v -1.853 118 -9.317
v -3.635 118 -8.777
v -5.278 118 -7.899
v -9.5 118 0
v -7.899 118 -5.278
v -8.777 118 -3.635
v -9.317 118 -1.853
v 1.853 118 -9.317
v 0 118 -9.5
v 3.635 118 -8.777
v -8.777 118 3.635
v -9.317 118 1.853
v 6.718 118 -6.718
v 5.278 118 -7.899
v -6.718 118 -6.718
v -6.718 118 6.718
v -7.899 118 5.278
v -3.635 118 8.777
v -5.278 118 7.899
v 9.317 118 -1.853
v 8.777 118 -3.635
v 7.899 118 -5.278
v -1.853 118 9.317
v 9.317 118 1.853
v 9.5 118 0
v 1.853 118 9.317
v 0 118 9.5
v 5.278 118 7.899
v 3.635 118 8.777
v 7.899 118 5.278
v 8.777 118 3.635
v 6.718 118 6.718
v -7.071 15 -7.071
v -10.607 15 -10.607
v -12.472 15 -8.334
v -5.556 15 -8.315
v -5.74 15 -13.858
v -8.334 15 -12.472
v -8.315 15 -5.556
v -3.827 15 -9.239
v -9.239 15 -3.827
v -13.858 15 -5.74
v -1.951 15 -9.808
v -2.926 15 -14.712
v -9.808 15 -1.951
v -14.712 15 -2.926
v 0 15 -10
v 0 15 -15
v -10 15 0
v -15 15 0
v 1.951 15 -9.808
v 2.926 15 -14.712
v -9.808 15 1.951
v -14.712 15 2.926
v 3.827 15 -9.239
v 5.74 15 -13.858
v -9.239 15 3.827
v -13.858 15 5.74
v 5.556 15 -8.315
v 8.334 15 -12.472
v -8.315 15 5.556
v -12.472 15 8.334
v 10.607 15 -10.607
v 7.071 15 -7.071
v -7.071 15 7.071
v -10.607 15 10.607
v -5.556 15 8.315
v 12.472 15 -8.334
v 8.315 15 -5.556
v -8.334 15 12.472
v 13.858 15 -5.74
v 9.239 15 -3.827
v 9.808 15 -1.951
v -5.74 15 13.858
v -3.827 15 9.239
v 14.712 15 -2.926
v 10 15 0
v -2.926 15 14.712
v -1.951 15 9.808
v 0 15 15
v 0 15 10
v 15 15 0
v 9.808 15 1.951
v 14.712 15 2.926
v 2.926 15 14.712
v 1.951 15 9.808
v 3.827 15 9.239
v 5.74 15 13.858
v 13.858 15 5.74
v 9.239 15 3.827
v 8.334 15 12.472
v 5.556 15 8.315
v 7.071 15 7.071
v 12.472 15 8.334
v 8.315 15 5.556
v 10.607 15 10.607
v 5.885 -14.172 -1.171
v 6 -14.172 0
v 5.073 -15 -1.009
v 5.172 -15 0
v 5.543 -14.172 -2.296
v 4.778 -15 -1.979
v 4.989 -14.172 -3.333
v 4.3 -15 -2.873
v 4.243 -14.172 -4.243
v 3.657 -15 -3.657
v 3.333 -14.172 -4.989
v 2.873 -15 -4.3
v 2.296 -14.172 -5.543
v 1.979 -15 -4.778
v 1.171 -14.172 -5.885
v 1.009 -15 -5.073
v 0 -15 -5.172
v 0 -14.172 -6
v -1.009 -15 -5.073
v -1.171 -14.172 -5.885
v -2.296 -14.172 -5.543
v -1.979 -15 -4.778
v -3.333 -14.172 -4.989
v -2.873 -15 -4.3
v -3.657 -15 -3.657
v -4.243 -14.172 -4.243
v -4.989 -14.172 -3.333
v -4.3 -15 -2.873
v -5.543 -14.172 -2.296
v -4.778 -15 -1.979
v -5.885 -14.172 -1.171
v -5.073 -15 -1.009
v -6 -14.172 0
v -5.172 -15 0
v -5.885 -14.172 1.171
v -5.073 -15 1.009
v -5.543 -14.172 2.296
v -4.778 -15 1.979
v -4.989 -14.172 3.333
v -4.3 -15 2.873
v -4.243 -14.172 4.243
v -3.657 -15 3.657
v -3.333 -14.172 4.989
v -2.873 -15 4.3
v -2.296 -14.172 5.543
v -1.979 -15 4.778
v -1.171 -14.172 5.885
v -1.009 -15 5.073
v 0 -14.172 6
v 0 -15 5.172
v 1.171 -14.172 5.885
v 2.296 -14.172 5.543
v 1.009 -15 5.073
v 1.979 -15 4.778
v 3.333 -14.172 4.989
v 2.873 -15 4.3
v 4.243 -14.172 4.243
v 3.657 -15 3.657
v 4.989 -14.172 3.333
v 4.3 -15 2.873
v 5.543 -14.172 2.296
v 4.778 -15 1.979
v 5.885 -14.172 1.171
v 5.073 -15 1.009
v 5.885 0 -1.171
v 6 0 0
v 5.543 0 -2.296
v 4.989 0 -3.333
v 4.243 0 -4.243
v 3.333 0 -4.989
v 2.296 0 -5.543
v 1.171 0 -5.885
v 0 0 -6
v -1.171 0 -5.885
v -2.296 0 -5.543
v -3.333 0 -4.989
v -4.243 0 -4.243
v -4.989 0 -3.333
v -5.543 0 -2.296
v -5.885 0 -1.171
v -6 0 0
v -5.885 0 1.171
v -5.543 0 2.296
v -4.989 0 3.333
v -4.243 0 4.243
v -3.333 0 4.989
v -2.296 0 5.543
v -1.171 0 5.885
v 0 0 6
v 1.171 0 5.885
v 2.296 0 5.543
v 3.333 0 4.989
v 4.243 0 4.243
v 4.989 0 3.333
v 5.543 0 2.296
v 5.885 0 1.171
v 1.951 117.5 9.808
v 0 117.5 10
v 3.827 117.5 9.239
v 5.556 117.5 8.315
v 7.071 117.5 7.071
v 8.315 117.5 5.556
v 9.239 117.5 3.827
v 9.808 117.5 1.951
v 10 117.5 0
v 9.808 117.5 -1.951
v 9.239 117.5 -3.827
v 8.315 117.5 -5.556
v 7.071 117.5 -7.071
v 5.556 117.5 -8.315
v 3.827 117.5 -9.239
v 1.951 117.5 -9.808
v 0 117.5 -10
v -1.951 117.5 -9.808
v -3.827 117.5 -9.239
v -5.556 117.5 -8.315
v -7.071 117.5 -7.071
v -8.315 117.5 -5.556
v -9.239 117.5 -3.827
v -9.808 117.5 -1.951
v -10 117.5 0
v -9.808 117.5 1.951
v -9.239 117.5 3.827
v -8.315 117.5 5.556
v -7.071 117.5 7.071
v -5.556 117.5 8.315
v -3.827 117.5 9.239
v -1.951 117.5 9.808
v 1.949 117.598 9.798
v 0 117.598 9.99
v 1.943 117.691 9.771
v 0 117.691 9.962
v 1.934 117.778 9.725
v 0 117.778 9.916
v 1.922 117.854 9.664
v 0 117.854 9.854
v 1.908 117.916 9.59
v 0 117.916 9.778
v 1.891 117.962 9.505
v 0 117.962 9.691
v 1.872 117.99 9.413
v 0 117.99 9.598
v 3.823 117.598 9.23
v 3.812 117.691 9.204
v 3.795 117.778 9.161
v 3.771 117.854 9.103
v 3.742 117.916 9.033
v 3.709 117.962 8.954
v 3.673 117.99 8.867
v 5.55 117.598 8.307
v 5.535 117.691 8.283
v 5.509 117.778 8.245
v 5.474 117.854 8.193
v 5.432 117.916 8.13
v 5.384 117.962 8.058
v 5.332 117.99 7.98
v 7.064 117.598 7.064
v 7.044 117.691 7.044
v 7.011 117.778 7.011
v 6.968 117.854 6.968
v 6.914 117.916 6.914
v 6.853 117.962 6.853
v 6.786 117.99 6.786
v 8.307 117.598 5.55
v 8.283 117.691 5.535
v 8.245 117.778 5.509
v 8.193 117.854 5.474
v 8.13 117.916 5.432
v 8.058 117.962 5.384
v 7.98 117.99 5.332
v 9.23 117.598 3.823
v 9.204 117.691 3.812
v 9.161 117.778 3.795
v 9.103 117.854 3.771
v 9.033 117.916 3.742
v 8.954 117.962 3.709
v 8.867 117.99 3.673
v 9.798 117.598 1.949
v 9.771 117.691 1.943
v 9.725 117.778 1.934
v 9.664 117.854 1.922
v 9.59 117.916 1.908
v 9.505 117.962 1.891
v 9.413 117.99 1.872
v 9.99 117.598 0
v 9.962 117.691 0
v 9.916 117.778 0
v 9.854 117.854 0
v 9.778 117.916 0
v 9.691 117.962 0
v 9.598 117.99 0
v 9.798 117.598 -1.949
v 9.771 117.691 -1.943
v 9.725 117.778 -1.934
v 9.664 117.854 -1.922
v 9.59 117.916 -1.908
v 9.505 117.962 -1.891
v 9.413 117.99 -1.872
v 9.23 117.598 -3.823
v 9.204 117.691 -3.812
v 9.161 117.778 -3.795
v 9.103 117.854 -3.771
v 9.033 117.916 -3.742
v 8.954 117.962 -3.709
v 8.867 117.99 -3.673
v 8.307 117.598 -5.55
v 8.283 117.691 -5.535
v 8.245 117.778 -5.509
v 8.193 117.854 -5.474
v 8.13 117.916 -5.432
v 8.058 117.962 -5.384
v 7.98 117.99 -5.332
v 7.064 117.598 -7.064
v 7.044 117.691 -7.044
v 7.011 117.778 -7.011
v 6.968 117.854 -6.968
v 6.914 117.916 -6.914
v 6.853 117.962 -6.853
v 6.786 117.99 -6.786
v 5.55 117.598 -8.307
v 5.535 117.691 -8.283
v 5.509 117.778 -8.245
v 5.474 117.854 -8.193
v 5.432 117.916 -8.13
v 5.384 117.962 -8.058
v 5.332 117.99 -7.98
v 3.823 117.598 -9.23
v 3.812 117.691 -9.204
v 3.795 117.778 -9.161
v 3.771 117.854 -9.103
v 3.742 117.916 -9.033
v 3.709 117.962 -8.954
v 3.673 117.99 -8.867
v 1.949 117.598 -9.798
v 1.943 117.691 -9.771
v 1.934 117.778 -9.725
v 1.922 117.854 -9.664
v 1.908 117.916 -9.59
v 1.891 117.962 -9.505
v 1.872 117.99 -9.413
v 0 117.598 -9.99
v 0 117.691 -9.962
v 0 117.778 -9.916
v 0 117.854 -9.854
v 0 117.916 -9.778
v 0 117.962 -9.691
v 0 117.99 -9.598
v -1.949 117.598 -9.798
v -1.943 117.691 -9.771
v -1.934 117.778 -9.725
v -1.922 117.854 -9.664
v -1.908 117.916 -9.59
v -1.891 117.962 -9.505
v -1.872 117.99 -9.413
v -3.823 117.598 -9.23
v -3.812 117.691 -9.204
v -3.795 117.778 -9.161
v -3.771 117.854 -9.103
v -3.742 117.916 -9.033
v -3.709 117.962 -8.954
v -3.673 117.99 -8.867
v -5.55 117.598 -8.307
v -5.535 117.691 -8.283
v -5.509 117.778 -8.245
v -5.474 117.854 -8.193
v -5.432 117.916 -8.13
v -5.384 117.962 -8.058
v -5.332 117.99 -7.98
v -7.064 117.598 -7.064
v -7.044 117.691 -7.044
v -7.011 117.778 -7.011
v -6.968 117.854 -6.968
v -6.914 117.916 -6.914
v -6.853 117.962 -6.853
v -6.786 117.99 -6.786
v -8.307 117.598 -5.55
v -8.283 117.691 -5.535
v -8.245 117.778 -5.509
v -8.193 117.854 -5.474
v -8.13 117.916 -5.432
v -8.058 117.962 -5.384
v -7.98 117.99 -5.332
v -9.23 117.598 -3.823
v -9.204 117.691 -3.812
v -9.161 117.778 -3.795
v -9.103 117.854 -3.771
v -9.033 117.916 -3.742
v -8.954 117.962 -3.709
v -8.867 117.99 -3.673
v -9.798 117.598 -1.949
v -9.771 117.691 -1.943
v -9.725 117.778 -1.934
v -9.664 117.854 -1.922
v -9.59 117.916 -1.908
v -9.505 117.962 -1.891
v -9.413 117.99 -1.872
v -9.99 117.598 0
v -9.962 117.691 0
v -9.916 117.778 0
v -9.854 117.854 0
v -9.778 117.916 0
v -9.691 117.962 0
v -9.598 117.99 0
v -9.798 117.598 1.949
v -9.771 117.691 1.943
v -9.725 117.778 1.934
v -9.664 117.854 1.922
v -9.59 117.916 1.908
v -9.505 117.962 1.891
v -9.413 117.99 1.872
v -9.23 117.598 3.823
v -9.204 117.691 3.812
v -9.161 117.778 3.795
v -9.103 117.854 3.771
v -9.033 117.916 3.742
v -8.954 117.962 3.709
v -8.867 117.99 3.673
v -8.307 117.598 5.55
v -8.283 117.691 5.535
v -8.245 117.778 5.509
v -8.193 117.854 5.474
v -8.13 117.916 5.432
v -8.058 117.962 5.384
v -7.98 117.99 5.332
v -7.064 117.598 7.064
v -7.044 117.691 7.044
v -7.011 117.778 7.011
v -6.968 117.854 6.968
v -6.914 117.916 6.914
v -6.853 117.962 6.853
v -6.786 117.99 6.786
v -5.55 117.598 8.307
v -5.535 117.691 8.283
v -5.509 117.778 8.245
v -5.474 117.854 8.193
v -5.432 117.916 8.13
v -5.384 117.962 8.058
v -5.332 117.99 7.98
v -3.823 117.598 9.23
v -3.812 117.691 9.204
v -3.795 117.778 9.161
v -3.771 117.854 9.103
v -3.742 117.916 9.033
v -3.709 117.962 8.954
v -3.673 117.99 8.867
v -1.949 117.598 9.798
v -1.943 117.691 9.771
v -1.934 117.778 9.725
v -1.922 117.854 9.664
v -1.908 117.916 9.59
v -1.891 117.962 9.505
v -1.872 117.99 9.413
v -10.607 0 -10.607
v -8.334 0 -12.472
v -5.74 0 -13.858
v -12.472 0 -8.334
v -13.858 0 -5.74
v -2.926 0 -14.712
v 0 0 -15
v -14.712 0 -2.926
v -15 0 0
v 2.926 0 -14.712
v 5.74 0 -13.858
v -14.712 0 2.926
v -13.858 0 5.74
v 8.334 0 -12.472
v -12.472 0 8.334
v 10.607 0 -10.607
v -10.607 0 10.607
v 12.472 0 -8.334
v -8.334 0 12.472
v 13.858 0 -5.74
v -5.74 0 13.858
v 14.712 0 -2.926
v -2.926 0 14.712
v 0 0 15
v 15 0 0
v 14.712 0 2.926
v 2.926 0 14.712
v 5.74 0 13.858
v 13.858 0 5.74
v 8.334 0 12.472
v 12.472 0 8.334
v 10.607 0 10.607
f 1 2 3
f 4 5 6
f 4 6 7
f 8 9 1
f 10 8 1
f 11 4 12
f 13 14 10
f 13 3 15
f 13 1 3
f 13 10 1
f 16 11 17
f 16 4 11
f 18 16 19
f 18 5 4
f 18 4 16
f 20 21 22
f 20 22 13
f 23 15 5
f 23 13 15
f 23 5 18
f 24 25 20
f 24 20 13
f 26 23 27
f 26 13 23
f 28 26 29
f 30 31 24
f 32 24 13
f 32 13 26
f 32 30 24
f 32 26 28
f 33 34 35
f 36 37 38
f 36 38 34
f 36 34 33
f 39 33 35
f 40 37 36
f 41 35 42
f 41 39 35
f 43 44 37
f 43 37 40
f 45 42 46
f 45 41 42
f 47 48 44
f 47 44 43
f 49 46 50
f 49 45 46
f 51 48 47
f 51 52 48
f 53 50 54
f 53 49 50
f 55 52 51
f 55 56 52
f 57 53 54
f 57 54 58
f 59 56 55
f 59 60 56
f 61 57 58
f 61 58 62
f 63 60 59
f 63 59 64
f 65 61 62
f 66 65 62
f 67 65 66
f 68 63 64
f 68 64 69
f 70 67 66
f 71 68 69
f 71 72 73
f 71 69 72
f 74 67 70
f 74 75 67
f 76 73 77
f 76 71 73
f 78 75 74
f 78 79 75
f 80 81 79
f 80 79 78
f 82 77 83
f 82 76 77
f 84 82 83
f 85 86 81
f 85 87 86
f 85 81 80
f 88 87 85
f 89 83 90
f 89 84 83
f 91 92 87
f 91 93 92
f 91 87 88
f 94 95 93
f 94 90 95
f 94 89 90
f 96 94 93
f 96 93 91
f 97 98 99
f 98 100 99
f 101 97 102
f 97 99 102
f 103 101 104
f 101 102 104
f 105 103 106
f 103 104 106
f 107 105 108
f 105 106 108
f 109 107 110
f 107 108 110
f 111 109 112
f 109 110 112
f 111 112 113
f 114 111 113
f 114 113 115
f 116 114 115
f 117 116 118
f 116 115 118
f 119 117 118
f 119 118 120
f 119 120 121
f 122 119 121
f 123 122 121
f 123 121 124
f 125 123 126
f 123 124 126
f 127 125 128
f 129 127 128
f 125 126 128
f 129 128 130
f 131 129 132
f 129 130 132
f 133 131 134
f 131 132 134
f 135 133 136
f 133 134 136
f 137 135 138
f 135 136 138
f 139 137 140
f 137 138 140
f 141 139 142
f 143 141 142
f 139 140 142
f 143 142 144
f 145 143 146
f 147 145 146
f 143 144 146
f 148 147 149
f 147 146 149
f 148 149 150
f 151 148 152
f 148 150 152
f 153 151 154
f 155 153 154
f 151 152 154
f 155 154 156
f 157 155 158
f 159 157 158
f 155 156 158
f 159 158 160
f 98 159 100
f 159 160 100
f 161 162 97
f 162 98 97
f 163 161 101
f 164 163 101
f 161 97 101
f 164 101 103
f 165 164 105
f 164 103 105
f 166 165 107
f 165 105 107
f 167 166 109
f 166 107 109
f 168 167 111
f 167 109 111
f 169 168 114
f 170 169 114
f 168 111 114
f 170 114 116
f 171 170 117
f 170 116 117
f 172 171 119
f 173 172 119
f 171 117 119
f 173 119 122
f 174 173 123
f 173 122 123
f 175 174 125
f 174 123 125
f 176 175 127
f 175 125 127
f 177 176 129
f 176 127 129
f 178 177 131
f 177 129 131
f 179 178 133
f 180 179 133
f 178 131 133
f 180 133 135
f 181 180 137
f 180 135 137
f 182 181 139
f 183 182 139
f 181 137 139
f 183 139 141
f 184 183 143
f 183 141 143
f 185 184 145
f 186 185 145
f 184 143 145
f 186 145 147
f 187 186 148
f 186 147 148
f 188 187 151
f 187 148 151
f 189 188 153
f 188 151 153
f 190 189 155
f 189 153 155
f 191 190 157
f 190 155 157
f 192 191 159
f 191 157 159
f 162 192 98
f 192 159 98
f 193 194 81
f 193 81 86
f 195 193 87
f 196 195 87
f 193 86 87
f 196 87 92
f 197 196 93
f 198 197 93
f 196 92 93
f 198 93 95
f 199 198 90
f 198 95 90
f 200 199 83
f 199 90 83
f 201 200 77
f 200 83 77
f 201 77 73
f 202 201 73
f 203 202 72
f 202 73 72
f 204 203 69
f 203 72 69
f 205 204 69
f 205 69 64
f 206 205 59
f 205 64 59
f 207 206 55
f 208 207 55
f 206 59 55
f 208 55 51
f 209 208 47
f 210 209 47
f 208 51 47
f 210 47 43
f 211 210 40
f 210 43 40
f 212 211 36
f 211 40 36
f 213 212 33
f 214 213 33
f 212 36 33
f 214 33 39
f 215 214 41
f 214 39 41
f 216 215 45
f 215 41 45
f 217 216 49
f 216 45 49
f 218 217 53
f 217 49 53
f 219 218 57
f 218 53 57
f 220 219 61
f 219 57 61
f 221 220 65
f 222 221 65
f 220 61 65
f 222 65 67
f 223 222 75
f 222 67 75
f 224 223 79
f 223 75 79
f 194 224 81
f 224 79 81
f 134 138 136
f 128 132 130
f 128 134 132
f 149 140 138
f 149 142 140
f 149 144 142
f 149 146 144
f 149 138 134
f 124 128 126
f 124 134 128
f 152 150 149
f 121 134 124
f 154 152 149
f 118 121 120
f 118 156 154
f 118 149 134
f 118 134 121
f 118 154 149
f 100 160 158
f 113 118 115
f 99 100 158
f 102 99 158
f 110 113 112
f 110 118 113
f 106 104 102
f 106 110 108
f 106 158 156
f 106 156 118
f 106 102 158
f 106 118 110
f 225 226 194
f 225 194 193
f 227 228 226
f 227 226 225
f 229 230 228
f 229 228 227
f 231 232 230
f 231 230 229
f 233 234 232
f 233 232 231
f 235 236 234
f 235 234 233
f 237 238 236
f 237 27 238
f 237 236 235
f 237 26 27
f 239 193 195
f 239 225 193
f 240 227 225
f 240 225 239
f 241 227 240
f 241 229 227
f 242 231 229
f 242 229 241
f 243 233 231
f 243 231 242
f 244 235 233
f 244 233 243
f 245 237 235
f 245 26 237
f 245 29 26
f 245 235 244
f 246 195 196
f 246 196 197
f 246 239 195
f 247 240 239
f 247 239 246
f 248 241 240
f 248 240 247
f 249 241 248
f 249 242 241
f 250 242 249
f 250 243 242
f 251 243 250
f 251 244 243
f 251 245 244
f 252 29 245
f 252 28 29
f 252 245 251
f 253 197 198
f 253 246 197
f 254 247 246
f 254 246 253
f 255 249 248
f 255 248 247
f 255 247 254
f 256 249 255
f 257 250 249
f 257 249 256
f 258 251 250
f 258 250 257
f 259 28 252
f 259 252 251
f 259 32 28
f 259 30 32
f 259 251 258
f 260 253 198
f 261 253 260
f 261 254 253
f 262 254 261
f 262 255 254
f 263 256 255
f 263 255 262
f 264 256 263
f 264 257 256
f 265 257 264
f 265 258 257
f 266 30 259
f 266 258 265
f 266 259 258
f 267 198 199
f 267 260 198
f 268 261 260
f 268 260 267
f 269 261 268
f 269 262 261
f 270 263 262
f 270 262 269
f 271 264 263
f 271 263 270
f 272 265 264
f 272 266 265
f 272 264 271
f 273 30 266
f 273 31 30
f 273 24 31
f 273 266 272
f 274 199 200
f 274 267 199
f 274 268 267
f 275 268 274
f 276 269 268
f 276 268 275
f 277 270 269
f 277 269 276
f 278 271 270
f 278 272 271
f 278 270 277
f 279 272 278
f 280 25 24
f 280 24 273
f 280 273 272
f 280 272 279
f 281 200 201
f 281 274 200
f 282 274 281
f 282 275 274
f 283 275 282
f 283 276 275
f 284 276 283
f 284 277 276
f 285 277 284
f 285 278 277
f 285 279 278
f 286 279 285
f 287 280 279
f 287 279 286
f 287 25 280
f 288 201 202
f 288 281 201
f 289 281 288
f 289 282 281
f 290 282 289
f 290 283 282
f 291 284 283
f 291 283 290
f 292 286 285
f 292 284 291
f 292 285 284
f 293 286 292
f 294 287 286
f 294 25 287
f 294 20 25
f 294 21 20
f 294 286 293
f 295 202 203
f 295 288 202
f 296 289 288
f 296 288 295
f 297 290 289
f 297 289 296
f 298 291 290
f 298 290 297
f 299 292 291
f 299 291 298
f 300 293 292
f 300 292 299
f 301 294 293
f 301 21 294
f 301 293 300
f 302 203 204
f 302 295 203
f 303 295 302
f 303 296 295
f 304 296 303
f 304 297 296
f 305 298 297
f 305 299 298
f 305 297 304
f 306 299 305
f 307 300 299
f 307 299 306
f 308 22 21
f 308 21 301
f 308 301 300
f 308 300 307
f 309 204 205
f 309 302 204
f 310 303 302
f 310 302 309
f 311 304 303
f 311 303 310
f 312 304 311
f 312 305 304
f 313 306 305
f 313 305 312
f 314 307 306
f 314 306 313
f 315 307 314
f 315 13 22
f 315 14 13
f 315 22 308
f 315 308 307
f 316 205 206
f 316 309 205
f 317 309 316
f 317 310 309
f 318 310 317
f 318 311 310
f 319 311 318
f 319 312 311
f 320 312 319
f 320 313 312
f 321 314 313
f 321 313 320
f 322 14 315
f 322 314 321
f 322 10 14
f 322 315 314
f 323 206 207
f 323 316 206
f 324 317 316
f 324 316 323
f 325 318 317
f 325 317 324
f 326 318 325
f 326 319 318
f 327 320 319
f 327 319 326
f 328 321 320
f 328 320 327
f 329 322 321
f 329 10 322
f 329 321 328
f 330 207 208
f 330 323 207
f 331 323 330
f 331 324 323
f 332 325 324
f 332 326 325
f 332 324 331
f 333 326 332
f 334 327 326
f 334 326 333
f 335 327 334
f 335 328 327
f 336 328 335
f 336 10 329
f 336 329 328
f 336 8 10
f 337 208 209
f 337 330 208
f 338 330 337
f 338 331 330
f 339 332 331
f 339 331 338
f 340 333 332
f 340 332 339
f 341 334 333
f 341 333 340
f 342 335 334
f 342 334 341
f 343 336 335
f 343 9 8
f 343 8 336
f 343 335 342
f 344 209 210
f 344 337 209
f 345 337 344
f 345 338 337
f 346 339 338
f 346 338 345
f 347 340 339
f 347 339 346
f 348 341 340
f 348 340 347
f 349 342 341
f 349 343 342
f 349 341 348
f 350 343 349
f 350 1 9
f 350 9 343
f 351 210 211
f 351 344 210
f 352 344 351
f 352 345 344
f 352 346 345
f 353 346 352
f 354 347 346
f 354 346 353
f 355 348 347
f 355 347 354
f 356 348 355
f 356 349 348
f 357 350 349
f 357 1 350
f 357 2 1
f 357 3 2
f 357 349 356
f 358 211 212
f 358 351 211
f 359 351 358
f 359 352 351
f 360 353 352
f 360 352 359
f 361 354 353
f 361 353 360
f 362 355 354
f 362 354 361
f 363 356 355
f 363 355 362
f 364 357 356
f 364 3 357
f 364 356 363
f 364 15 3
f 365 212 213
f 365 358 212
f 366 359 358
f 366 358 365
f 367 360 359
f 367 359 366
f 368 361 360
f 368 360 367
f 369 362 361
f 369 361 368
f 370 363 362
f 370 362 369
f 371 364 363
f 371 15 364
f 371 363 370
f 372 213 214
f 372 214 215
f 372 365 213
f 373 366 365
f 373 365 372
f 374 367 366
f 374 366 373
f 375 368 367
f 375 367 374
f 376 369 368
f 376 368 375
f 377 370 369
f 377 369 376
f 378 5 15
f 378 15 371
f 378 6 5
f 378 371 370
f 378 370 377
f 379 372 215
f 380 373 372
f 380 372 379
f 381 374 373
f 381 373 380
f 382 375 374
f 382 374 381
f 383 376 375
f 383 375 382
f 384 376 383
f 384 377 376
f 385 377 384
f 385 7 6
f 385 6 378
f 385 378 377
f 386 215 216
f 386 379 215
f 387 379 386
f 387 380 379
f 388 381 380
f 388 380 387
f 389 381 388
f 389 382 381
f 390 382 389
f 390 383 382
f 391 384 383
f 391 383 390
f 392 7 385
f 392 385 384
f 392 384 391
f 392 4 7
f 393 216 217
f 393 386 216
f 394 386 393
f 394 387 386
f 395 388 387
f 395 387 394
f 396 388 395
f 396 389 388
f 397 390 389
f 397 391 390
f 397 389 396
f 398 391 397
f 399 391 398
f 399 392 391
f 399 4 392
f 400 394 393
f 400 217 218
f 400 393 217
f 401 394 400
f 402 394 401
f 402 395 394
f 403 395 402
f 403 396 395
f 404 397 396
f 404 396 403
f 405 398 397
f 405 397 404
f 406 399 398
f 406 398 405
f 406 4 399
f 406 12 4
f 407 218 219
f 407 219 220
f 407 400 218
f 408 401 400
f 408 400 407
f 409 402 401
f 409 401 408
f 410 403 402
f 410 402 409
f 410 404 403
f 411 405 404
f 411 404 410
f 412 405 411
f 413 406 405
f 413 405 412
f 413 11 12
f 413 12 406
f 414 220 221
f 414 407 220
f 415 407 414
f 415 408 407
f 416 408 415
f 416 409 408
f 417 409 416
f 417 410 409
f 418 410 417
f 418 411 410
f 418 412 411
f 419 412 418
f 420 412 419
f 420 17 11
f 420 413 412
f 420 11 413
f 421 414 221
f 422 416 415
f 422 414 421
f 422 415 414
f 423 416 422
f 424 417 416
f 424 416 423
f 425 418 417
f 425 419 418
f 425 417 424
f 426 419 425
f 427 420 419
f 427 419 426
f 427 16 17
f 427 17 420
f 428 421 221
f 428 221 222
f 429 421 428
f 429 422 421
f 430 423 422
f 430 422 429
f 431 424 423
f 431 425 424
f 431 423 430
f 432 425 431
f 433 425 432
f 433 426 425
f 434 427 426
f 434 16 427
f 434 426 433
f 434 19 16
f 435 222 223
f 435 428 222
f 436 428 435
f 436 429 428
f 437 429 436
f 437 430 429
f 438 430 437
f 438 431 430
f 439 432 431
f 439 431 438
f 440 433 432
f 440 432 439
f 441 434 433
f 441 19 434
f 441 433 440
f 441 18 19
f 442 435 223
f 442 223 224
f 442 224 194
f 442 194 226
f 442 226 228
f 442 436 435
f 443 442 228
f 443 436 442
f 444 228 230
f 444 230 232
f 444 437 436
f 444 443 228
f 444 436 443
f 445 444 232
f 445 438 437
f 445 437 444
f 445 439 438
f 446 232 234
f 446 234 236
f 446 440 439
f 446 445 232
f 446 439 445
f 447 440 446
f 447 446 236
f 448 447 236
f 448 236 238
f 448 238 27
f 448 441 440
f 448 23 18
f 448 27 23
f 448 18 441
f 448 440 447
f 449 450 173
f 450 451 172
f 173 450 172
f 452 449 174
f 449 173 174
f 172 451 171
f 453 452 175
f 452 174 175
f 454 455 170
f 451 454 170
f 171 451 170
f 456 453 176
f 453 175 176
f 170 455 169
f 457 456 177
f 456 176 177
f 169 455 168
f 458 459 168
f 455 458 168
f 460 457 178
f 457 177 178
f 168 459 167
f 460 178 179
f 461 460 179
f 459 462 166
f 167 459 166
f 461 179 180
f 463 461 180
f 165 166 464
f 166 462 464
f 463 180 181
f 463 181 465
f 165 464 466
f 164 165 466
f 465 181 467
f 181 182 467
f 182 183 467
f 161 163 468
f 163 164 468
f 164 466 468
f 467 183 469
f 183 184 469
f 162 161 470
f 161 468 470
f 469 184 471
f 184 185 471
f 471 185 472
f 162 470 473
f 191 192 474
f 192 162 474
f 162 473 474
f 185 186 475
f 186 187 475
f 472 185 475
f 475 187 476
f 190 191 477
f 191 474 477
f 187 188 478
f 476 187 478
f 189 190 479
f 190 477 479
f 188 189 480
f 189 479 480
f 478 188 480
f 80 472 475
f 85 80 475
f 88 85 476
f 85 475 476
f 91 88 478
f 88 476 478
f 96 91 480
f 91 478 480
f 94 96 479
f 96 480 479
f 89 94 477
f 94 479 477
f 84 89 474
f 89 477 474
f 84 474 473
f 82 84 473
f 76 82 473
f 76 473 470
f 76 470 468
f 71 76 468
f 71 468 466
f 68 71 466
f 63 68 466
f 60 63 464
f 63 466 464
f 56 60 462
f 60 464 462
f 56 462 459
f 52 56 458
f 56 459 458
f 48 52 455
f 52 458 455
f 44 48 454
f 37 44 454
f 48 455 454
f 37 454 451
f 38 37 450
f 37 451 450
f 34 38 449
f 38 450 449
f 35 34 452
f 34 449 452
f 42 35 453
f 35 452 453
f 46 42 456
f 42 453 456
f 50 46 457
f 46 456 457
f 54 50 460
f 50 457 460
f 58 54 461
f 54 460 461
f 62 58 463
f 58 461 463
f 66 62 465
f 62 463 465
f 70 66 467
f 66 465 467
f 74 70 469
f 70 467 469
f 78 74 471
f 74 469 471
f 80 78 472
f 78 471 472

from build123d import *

# Parameters (mm, degrees)
SKETCH1_R           = 15
BOSS_EXTRUDE1_DEPTH = 15
SKETCH2_R           = 10
BOSS_EXTRUDE2_DEPTH = 103
SKETCH3_R           = 7.5
BOSS_EXTRUDE3_DEPTH = 15
FILLET1_R           = 0.5


# Read off the part's stored shape, not the designer's step: M12x1.5 Machine Threads Stud1
with BuildPart() as part:
    # Sketch1 → Boss-Extrude1 (new body)
    with BuildSketch(Plane(origin=(0, 0, 0), x_dir=(1, 0, 0), z_dir=(0, 1, 0))):
        with Locations(Location((0, 0, 0), (0, 0, 270))):
            Circle(SKETCH1_R)
    extrude(amount=BOSS_EXTRUDE1_DEPTH)

    # Sketch2 → Boss-Extrude2 (add)
    with BuildSketch(Plane(origin=(0, 15, 0), x_dir=(1, 0, 0), z_dir=(0, 1, 0))):
        with Locations(Location((0, 0, 0), (0, 0, 270))):
            Circle(SKETCH2_R)
    extrude(amount=BOSS_EXTRUDE2_DEPTH)

    # Sketch3 → Boss-Extrude3 (add)
    with BuildSketch(Plane.XZ):
        with Locations(Location((0, 0, 0), (0, 0, 270))):
            Circle(SKETCH3_R)
    extrude(amount=BOSS_EXTRUDE3_DEPTH)

    # M12x1.5 Machine Threads Stud1 outline → M12x1.5 Machine Threads Stud1 (revolve, cut)
    with BuildSketch(Plane.XY):
        Polygon((7.5, 0), (6, 0), (6, -14.172), (5.172, -15), (7.5, -15), align=None)
    revolve(axis=Axis((0, 0, 0), (0, 1, 0)), mode=Mode.SUBTRACT)

    # Fillet1
    fillet1_edges = [part.edges().sort_by_distance(p)[0] for p in [
        (0, 118, -10),
    ]]
    fillet(fillet1_edges, radius=FILLET1_R)


solid = part.part
